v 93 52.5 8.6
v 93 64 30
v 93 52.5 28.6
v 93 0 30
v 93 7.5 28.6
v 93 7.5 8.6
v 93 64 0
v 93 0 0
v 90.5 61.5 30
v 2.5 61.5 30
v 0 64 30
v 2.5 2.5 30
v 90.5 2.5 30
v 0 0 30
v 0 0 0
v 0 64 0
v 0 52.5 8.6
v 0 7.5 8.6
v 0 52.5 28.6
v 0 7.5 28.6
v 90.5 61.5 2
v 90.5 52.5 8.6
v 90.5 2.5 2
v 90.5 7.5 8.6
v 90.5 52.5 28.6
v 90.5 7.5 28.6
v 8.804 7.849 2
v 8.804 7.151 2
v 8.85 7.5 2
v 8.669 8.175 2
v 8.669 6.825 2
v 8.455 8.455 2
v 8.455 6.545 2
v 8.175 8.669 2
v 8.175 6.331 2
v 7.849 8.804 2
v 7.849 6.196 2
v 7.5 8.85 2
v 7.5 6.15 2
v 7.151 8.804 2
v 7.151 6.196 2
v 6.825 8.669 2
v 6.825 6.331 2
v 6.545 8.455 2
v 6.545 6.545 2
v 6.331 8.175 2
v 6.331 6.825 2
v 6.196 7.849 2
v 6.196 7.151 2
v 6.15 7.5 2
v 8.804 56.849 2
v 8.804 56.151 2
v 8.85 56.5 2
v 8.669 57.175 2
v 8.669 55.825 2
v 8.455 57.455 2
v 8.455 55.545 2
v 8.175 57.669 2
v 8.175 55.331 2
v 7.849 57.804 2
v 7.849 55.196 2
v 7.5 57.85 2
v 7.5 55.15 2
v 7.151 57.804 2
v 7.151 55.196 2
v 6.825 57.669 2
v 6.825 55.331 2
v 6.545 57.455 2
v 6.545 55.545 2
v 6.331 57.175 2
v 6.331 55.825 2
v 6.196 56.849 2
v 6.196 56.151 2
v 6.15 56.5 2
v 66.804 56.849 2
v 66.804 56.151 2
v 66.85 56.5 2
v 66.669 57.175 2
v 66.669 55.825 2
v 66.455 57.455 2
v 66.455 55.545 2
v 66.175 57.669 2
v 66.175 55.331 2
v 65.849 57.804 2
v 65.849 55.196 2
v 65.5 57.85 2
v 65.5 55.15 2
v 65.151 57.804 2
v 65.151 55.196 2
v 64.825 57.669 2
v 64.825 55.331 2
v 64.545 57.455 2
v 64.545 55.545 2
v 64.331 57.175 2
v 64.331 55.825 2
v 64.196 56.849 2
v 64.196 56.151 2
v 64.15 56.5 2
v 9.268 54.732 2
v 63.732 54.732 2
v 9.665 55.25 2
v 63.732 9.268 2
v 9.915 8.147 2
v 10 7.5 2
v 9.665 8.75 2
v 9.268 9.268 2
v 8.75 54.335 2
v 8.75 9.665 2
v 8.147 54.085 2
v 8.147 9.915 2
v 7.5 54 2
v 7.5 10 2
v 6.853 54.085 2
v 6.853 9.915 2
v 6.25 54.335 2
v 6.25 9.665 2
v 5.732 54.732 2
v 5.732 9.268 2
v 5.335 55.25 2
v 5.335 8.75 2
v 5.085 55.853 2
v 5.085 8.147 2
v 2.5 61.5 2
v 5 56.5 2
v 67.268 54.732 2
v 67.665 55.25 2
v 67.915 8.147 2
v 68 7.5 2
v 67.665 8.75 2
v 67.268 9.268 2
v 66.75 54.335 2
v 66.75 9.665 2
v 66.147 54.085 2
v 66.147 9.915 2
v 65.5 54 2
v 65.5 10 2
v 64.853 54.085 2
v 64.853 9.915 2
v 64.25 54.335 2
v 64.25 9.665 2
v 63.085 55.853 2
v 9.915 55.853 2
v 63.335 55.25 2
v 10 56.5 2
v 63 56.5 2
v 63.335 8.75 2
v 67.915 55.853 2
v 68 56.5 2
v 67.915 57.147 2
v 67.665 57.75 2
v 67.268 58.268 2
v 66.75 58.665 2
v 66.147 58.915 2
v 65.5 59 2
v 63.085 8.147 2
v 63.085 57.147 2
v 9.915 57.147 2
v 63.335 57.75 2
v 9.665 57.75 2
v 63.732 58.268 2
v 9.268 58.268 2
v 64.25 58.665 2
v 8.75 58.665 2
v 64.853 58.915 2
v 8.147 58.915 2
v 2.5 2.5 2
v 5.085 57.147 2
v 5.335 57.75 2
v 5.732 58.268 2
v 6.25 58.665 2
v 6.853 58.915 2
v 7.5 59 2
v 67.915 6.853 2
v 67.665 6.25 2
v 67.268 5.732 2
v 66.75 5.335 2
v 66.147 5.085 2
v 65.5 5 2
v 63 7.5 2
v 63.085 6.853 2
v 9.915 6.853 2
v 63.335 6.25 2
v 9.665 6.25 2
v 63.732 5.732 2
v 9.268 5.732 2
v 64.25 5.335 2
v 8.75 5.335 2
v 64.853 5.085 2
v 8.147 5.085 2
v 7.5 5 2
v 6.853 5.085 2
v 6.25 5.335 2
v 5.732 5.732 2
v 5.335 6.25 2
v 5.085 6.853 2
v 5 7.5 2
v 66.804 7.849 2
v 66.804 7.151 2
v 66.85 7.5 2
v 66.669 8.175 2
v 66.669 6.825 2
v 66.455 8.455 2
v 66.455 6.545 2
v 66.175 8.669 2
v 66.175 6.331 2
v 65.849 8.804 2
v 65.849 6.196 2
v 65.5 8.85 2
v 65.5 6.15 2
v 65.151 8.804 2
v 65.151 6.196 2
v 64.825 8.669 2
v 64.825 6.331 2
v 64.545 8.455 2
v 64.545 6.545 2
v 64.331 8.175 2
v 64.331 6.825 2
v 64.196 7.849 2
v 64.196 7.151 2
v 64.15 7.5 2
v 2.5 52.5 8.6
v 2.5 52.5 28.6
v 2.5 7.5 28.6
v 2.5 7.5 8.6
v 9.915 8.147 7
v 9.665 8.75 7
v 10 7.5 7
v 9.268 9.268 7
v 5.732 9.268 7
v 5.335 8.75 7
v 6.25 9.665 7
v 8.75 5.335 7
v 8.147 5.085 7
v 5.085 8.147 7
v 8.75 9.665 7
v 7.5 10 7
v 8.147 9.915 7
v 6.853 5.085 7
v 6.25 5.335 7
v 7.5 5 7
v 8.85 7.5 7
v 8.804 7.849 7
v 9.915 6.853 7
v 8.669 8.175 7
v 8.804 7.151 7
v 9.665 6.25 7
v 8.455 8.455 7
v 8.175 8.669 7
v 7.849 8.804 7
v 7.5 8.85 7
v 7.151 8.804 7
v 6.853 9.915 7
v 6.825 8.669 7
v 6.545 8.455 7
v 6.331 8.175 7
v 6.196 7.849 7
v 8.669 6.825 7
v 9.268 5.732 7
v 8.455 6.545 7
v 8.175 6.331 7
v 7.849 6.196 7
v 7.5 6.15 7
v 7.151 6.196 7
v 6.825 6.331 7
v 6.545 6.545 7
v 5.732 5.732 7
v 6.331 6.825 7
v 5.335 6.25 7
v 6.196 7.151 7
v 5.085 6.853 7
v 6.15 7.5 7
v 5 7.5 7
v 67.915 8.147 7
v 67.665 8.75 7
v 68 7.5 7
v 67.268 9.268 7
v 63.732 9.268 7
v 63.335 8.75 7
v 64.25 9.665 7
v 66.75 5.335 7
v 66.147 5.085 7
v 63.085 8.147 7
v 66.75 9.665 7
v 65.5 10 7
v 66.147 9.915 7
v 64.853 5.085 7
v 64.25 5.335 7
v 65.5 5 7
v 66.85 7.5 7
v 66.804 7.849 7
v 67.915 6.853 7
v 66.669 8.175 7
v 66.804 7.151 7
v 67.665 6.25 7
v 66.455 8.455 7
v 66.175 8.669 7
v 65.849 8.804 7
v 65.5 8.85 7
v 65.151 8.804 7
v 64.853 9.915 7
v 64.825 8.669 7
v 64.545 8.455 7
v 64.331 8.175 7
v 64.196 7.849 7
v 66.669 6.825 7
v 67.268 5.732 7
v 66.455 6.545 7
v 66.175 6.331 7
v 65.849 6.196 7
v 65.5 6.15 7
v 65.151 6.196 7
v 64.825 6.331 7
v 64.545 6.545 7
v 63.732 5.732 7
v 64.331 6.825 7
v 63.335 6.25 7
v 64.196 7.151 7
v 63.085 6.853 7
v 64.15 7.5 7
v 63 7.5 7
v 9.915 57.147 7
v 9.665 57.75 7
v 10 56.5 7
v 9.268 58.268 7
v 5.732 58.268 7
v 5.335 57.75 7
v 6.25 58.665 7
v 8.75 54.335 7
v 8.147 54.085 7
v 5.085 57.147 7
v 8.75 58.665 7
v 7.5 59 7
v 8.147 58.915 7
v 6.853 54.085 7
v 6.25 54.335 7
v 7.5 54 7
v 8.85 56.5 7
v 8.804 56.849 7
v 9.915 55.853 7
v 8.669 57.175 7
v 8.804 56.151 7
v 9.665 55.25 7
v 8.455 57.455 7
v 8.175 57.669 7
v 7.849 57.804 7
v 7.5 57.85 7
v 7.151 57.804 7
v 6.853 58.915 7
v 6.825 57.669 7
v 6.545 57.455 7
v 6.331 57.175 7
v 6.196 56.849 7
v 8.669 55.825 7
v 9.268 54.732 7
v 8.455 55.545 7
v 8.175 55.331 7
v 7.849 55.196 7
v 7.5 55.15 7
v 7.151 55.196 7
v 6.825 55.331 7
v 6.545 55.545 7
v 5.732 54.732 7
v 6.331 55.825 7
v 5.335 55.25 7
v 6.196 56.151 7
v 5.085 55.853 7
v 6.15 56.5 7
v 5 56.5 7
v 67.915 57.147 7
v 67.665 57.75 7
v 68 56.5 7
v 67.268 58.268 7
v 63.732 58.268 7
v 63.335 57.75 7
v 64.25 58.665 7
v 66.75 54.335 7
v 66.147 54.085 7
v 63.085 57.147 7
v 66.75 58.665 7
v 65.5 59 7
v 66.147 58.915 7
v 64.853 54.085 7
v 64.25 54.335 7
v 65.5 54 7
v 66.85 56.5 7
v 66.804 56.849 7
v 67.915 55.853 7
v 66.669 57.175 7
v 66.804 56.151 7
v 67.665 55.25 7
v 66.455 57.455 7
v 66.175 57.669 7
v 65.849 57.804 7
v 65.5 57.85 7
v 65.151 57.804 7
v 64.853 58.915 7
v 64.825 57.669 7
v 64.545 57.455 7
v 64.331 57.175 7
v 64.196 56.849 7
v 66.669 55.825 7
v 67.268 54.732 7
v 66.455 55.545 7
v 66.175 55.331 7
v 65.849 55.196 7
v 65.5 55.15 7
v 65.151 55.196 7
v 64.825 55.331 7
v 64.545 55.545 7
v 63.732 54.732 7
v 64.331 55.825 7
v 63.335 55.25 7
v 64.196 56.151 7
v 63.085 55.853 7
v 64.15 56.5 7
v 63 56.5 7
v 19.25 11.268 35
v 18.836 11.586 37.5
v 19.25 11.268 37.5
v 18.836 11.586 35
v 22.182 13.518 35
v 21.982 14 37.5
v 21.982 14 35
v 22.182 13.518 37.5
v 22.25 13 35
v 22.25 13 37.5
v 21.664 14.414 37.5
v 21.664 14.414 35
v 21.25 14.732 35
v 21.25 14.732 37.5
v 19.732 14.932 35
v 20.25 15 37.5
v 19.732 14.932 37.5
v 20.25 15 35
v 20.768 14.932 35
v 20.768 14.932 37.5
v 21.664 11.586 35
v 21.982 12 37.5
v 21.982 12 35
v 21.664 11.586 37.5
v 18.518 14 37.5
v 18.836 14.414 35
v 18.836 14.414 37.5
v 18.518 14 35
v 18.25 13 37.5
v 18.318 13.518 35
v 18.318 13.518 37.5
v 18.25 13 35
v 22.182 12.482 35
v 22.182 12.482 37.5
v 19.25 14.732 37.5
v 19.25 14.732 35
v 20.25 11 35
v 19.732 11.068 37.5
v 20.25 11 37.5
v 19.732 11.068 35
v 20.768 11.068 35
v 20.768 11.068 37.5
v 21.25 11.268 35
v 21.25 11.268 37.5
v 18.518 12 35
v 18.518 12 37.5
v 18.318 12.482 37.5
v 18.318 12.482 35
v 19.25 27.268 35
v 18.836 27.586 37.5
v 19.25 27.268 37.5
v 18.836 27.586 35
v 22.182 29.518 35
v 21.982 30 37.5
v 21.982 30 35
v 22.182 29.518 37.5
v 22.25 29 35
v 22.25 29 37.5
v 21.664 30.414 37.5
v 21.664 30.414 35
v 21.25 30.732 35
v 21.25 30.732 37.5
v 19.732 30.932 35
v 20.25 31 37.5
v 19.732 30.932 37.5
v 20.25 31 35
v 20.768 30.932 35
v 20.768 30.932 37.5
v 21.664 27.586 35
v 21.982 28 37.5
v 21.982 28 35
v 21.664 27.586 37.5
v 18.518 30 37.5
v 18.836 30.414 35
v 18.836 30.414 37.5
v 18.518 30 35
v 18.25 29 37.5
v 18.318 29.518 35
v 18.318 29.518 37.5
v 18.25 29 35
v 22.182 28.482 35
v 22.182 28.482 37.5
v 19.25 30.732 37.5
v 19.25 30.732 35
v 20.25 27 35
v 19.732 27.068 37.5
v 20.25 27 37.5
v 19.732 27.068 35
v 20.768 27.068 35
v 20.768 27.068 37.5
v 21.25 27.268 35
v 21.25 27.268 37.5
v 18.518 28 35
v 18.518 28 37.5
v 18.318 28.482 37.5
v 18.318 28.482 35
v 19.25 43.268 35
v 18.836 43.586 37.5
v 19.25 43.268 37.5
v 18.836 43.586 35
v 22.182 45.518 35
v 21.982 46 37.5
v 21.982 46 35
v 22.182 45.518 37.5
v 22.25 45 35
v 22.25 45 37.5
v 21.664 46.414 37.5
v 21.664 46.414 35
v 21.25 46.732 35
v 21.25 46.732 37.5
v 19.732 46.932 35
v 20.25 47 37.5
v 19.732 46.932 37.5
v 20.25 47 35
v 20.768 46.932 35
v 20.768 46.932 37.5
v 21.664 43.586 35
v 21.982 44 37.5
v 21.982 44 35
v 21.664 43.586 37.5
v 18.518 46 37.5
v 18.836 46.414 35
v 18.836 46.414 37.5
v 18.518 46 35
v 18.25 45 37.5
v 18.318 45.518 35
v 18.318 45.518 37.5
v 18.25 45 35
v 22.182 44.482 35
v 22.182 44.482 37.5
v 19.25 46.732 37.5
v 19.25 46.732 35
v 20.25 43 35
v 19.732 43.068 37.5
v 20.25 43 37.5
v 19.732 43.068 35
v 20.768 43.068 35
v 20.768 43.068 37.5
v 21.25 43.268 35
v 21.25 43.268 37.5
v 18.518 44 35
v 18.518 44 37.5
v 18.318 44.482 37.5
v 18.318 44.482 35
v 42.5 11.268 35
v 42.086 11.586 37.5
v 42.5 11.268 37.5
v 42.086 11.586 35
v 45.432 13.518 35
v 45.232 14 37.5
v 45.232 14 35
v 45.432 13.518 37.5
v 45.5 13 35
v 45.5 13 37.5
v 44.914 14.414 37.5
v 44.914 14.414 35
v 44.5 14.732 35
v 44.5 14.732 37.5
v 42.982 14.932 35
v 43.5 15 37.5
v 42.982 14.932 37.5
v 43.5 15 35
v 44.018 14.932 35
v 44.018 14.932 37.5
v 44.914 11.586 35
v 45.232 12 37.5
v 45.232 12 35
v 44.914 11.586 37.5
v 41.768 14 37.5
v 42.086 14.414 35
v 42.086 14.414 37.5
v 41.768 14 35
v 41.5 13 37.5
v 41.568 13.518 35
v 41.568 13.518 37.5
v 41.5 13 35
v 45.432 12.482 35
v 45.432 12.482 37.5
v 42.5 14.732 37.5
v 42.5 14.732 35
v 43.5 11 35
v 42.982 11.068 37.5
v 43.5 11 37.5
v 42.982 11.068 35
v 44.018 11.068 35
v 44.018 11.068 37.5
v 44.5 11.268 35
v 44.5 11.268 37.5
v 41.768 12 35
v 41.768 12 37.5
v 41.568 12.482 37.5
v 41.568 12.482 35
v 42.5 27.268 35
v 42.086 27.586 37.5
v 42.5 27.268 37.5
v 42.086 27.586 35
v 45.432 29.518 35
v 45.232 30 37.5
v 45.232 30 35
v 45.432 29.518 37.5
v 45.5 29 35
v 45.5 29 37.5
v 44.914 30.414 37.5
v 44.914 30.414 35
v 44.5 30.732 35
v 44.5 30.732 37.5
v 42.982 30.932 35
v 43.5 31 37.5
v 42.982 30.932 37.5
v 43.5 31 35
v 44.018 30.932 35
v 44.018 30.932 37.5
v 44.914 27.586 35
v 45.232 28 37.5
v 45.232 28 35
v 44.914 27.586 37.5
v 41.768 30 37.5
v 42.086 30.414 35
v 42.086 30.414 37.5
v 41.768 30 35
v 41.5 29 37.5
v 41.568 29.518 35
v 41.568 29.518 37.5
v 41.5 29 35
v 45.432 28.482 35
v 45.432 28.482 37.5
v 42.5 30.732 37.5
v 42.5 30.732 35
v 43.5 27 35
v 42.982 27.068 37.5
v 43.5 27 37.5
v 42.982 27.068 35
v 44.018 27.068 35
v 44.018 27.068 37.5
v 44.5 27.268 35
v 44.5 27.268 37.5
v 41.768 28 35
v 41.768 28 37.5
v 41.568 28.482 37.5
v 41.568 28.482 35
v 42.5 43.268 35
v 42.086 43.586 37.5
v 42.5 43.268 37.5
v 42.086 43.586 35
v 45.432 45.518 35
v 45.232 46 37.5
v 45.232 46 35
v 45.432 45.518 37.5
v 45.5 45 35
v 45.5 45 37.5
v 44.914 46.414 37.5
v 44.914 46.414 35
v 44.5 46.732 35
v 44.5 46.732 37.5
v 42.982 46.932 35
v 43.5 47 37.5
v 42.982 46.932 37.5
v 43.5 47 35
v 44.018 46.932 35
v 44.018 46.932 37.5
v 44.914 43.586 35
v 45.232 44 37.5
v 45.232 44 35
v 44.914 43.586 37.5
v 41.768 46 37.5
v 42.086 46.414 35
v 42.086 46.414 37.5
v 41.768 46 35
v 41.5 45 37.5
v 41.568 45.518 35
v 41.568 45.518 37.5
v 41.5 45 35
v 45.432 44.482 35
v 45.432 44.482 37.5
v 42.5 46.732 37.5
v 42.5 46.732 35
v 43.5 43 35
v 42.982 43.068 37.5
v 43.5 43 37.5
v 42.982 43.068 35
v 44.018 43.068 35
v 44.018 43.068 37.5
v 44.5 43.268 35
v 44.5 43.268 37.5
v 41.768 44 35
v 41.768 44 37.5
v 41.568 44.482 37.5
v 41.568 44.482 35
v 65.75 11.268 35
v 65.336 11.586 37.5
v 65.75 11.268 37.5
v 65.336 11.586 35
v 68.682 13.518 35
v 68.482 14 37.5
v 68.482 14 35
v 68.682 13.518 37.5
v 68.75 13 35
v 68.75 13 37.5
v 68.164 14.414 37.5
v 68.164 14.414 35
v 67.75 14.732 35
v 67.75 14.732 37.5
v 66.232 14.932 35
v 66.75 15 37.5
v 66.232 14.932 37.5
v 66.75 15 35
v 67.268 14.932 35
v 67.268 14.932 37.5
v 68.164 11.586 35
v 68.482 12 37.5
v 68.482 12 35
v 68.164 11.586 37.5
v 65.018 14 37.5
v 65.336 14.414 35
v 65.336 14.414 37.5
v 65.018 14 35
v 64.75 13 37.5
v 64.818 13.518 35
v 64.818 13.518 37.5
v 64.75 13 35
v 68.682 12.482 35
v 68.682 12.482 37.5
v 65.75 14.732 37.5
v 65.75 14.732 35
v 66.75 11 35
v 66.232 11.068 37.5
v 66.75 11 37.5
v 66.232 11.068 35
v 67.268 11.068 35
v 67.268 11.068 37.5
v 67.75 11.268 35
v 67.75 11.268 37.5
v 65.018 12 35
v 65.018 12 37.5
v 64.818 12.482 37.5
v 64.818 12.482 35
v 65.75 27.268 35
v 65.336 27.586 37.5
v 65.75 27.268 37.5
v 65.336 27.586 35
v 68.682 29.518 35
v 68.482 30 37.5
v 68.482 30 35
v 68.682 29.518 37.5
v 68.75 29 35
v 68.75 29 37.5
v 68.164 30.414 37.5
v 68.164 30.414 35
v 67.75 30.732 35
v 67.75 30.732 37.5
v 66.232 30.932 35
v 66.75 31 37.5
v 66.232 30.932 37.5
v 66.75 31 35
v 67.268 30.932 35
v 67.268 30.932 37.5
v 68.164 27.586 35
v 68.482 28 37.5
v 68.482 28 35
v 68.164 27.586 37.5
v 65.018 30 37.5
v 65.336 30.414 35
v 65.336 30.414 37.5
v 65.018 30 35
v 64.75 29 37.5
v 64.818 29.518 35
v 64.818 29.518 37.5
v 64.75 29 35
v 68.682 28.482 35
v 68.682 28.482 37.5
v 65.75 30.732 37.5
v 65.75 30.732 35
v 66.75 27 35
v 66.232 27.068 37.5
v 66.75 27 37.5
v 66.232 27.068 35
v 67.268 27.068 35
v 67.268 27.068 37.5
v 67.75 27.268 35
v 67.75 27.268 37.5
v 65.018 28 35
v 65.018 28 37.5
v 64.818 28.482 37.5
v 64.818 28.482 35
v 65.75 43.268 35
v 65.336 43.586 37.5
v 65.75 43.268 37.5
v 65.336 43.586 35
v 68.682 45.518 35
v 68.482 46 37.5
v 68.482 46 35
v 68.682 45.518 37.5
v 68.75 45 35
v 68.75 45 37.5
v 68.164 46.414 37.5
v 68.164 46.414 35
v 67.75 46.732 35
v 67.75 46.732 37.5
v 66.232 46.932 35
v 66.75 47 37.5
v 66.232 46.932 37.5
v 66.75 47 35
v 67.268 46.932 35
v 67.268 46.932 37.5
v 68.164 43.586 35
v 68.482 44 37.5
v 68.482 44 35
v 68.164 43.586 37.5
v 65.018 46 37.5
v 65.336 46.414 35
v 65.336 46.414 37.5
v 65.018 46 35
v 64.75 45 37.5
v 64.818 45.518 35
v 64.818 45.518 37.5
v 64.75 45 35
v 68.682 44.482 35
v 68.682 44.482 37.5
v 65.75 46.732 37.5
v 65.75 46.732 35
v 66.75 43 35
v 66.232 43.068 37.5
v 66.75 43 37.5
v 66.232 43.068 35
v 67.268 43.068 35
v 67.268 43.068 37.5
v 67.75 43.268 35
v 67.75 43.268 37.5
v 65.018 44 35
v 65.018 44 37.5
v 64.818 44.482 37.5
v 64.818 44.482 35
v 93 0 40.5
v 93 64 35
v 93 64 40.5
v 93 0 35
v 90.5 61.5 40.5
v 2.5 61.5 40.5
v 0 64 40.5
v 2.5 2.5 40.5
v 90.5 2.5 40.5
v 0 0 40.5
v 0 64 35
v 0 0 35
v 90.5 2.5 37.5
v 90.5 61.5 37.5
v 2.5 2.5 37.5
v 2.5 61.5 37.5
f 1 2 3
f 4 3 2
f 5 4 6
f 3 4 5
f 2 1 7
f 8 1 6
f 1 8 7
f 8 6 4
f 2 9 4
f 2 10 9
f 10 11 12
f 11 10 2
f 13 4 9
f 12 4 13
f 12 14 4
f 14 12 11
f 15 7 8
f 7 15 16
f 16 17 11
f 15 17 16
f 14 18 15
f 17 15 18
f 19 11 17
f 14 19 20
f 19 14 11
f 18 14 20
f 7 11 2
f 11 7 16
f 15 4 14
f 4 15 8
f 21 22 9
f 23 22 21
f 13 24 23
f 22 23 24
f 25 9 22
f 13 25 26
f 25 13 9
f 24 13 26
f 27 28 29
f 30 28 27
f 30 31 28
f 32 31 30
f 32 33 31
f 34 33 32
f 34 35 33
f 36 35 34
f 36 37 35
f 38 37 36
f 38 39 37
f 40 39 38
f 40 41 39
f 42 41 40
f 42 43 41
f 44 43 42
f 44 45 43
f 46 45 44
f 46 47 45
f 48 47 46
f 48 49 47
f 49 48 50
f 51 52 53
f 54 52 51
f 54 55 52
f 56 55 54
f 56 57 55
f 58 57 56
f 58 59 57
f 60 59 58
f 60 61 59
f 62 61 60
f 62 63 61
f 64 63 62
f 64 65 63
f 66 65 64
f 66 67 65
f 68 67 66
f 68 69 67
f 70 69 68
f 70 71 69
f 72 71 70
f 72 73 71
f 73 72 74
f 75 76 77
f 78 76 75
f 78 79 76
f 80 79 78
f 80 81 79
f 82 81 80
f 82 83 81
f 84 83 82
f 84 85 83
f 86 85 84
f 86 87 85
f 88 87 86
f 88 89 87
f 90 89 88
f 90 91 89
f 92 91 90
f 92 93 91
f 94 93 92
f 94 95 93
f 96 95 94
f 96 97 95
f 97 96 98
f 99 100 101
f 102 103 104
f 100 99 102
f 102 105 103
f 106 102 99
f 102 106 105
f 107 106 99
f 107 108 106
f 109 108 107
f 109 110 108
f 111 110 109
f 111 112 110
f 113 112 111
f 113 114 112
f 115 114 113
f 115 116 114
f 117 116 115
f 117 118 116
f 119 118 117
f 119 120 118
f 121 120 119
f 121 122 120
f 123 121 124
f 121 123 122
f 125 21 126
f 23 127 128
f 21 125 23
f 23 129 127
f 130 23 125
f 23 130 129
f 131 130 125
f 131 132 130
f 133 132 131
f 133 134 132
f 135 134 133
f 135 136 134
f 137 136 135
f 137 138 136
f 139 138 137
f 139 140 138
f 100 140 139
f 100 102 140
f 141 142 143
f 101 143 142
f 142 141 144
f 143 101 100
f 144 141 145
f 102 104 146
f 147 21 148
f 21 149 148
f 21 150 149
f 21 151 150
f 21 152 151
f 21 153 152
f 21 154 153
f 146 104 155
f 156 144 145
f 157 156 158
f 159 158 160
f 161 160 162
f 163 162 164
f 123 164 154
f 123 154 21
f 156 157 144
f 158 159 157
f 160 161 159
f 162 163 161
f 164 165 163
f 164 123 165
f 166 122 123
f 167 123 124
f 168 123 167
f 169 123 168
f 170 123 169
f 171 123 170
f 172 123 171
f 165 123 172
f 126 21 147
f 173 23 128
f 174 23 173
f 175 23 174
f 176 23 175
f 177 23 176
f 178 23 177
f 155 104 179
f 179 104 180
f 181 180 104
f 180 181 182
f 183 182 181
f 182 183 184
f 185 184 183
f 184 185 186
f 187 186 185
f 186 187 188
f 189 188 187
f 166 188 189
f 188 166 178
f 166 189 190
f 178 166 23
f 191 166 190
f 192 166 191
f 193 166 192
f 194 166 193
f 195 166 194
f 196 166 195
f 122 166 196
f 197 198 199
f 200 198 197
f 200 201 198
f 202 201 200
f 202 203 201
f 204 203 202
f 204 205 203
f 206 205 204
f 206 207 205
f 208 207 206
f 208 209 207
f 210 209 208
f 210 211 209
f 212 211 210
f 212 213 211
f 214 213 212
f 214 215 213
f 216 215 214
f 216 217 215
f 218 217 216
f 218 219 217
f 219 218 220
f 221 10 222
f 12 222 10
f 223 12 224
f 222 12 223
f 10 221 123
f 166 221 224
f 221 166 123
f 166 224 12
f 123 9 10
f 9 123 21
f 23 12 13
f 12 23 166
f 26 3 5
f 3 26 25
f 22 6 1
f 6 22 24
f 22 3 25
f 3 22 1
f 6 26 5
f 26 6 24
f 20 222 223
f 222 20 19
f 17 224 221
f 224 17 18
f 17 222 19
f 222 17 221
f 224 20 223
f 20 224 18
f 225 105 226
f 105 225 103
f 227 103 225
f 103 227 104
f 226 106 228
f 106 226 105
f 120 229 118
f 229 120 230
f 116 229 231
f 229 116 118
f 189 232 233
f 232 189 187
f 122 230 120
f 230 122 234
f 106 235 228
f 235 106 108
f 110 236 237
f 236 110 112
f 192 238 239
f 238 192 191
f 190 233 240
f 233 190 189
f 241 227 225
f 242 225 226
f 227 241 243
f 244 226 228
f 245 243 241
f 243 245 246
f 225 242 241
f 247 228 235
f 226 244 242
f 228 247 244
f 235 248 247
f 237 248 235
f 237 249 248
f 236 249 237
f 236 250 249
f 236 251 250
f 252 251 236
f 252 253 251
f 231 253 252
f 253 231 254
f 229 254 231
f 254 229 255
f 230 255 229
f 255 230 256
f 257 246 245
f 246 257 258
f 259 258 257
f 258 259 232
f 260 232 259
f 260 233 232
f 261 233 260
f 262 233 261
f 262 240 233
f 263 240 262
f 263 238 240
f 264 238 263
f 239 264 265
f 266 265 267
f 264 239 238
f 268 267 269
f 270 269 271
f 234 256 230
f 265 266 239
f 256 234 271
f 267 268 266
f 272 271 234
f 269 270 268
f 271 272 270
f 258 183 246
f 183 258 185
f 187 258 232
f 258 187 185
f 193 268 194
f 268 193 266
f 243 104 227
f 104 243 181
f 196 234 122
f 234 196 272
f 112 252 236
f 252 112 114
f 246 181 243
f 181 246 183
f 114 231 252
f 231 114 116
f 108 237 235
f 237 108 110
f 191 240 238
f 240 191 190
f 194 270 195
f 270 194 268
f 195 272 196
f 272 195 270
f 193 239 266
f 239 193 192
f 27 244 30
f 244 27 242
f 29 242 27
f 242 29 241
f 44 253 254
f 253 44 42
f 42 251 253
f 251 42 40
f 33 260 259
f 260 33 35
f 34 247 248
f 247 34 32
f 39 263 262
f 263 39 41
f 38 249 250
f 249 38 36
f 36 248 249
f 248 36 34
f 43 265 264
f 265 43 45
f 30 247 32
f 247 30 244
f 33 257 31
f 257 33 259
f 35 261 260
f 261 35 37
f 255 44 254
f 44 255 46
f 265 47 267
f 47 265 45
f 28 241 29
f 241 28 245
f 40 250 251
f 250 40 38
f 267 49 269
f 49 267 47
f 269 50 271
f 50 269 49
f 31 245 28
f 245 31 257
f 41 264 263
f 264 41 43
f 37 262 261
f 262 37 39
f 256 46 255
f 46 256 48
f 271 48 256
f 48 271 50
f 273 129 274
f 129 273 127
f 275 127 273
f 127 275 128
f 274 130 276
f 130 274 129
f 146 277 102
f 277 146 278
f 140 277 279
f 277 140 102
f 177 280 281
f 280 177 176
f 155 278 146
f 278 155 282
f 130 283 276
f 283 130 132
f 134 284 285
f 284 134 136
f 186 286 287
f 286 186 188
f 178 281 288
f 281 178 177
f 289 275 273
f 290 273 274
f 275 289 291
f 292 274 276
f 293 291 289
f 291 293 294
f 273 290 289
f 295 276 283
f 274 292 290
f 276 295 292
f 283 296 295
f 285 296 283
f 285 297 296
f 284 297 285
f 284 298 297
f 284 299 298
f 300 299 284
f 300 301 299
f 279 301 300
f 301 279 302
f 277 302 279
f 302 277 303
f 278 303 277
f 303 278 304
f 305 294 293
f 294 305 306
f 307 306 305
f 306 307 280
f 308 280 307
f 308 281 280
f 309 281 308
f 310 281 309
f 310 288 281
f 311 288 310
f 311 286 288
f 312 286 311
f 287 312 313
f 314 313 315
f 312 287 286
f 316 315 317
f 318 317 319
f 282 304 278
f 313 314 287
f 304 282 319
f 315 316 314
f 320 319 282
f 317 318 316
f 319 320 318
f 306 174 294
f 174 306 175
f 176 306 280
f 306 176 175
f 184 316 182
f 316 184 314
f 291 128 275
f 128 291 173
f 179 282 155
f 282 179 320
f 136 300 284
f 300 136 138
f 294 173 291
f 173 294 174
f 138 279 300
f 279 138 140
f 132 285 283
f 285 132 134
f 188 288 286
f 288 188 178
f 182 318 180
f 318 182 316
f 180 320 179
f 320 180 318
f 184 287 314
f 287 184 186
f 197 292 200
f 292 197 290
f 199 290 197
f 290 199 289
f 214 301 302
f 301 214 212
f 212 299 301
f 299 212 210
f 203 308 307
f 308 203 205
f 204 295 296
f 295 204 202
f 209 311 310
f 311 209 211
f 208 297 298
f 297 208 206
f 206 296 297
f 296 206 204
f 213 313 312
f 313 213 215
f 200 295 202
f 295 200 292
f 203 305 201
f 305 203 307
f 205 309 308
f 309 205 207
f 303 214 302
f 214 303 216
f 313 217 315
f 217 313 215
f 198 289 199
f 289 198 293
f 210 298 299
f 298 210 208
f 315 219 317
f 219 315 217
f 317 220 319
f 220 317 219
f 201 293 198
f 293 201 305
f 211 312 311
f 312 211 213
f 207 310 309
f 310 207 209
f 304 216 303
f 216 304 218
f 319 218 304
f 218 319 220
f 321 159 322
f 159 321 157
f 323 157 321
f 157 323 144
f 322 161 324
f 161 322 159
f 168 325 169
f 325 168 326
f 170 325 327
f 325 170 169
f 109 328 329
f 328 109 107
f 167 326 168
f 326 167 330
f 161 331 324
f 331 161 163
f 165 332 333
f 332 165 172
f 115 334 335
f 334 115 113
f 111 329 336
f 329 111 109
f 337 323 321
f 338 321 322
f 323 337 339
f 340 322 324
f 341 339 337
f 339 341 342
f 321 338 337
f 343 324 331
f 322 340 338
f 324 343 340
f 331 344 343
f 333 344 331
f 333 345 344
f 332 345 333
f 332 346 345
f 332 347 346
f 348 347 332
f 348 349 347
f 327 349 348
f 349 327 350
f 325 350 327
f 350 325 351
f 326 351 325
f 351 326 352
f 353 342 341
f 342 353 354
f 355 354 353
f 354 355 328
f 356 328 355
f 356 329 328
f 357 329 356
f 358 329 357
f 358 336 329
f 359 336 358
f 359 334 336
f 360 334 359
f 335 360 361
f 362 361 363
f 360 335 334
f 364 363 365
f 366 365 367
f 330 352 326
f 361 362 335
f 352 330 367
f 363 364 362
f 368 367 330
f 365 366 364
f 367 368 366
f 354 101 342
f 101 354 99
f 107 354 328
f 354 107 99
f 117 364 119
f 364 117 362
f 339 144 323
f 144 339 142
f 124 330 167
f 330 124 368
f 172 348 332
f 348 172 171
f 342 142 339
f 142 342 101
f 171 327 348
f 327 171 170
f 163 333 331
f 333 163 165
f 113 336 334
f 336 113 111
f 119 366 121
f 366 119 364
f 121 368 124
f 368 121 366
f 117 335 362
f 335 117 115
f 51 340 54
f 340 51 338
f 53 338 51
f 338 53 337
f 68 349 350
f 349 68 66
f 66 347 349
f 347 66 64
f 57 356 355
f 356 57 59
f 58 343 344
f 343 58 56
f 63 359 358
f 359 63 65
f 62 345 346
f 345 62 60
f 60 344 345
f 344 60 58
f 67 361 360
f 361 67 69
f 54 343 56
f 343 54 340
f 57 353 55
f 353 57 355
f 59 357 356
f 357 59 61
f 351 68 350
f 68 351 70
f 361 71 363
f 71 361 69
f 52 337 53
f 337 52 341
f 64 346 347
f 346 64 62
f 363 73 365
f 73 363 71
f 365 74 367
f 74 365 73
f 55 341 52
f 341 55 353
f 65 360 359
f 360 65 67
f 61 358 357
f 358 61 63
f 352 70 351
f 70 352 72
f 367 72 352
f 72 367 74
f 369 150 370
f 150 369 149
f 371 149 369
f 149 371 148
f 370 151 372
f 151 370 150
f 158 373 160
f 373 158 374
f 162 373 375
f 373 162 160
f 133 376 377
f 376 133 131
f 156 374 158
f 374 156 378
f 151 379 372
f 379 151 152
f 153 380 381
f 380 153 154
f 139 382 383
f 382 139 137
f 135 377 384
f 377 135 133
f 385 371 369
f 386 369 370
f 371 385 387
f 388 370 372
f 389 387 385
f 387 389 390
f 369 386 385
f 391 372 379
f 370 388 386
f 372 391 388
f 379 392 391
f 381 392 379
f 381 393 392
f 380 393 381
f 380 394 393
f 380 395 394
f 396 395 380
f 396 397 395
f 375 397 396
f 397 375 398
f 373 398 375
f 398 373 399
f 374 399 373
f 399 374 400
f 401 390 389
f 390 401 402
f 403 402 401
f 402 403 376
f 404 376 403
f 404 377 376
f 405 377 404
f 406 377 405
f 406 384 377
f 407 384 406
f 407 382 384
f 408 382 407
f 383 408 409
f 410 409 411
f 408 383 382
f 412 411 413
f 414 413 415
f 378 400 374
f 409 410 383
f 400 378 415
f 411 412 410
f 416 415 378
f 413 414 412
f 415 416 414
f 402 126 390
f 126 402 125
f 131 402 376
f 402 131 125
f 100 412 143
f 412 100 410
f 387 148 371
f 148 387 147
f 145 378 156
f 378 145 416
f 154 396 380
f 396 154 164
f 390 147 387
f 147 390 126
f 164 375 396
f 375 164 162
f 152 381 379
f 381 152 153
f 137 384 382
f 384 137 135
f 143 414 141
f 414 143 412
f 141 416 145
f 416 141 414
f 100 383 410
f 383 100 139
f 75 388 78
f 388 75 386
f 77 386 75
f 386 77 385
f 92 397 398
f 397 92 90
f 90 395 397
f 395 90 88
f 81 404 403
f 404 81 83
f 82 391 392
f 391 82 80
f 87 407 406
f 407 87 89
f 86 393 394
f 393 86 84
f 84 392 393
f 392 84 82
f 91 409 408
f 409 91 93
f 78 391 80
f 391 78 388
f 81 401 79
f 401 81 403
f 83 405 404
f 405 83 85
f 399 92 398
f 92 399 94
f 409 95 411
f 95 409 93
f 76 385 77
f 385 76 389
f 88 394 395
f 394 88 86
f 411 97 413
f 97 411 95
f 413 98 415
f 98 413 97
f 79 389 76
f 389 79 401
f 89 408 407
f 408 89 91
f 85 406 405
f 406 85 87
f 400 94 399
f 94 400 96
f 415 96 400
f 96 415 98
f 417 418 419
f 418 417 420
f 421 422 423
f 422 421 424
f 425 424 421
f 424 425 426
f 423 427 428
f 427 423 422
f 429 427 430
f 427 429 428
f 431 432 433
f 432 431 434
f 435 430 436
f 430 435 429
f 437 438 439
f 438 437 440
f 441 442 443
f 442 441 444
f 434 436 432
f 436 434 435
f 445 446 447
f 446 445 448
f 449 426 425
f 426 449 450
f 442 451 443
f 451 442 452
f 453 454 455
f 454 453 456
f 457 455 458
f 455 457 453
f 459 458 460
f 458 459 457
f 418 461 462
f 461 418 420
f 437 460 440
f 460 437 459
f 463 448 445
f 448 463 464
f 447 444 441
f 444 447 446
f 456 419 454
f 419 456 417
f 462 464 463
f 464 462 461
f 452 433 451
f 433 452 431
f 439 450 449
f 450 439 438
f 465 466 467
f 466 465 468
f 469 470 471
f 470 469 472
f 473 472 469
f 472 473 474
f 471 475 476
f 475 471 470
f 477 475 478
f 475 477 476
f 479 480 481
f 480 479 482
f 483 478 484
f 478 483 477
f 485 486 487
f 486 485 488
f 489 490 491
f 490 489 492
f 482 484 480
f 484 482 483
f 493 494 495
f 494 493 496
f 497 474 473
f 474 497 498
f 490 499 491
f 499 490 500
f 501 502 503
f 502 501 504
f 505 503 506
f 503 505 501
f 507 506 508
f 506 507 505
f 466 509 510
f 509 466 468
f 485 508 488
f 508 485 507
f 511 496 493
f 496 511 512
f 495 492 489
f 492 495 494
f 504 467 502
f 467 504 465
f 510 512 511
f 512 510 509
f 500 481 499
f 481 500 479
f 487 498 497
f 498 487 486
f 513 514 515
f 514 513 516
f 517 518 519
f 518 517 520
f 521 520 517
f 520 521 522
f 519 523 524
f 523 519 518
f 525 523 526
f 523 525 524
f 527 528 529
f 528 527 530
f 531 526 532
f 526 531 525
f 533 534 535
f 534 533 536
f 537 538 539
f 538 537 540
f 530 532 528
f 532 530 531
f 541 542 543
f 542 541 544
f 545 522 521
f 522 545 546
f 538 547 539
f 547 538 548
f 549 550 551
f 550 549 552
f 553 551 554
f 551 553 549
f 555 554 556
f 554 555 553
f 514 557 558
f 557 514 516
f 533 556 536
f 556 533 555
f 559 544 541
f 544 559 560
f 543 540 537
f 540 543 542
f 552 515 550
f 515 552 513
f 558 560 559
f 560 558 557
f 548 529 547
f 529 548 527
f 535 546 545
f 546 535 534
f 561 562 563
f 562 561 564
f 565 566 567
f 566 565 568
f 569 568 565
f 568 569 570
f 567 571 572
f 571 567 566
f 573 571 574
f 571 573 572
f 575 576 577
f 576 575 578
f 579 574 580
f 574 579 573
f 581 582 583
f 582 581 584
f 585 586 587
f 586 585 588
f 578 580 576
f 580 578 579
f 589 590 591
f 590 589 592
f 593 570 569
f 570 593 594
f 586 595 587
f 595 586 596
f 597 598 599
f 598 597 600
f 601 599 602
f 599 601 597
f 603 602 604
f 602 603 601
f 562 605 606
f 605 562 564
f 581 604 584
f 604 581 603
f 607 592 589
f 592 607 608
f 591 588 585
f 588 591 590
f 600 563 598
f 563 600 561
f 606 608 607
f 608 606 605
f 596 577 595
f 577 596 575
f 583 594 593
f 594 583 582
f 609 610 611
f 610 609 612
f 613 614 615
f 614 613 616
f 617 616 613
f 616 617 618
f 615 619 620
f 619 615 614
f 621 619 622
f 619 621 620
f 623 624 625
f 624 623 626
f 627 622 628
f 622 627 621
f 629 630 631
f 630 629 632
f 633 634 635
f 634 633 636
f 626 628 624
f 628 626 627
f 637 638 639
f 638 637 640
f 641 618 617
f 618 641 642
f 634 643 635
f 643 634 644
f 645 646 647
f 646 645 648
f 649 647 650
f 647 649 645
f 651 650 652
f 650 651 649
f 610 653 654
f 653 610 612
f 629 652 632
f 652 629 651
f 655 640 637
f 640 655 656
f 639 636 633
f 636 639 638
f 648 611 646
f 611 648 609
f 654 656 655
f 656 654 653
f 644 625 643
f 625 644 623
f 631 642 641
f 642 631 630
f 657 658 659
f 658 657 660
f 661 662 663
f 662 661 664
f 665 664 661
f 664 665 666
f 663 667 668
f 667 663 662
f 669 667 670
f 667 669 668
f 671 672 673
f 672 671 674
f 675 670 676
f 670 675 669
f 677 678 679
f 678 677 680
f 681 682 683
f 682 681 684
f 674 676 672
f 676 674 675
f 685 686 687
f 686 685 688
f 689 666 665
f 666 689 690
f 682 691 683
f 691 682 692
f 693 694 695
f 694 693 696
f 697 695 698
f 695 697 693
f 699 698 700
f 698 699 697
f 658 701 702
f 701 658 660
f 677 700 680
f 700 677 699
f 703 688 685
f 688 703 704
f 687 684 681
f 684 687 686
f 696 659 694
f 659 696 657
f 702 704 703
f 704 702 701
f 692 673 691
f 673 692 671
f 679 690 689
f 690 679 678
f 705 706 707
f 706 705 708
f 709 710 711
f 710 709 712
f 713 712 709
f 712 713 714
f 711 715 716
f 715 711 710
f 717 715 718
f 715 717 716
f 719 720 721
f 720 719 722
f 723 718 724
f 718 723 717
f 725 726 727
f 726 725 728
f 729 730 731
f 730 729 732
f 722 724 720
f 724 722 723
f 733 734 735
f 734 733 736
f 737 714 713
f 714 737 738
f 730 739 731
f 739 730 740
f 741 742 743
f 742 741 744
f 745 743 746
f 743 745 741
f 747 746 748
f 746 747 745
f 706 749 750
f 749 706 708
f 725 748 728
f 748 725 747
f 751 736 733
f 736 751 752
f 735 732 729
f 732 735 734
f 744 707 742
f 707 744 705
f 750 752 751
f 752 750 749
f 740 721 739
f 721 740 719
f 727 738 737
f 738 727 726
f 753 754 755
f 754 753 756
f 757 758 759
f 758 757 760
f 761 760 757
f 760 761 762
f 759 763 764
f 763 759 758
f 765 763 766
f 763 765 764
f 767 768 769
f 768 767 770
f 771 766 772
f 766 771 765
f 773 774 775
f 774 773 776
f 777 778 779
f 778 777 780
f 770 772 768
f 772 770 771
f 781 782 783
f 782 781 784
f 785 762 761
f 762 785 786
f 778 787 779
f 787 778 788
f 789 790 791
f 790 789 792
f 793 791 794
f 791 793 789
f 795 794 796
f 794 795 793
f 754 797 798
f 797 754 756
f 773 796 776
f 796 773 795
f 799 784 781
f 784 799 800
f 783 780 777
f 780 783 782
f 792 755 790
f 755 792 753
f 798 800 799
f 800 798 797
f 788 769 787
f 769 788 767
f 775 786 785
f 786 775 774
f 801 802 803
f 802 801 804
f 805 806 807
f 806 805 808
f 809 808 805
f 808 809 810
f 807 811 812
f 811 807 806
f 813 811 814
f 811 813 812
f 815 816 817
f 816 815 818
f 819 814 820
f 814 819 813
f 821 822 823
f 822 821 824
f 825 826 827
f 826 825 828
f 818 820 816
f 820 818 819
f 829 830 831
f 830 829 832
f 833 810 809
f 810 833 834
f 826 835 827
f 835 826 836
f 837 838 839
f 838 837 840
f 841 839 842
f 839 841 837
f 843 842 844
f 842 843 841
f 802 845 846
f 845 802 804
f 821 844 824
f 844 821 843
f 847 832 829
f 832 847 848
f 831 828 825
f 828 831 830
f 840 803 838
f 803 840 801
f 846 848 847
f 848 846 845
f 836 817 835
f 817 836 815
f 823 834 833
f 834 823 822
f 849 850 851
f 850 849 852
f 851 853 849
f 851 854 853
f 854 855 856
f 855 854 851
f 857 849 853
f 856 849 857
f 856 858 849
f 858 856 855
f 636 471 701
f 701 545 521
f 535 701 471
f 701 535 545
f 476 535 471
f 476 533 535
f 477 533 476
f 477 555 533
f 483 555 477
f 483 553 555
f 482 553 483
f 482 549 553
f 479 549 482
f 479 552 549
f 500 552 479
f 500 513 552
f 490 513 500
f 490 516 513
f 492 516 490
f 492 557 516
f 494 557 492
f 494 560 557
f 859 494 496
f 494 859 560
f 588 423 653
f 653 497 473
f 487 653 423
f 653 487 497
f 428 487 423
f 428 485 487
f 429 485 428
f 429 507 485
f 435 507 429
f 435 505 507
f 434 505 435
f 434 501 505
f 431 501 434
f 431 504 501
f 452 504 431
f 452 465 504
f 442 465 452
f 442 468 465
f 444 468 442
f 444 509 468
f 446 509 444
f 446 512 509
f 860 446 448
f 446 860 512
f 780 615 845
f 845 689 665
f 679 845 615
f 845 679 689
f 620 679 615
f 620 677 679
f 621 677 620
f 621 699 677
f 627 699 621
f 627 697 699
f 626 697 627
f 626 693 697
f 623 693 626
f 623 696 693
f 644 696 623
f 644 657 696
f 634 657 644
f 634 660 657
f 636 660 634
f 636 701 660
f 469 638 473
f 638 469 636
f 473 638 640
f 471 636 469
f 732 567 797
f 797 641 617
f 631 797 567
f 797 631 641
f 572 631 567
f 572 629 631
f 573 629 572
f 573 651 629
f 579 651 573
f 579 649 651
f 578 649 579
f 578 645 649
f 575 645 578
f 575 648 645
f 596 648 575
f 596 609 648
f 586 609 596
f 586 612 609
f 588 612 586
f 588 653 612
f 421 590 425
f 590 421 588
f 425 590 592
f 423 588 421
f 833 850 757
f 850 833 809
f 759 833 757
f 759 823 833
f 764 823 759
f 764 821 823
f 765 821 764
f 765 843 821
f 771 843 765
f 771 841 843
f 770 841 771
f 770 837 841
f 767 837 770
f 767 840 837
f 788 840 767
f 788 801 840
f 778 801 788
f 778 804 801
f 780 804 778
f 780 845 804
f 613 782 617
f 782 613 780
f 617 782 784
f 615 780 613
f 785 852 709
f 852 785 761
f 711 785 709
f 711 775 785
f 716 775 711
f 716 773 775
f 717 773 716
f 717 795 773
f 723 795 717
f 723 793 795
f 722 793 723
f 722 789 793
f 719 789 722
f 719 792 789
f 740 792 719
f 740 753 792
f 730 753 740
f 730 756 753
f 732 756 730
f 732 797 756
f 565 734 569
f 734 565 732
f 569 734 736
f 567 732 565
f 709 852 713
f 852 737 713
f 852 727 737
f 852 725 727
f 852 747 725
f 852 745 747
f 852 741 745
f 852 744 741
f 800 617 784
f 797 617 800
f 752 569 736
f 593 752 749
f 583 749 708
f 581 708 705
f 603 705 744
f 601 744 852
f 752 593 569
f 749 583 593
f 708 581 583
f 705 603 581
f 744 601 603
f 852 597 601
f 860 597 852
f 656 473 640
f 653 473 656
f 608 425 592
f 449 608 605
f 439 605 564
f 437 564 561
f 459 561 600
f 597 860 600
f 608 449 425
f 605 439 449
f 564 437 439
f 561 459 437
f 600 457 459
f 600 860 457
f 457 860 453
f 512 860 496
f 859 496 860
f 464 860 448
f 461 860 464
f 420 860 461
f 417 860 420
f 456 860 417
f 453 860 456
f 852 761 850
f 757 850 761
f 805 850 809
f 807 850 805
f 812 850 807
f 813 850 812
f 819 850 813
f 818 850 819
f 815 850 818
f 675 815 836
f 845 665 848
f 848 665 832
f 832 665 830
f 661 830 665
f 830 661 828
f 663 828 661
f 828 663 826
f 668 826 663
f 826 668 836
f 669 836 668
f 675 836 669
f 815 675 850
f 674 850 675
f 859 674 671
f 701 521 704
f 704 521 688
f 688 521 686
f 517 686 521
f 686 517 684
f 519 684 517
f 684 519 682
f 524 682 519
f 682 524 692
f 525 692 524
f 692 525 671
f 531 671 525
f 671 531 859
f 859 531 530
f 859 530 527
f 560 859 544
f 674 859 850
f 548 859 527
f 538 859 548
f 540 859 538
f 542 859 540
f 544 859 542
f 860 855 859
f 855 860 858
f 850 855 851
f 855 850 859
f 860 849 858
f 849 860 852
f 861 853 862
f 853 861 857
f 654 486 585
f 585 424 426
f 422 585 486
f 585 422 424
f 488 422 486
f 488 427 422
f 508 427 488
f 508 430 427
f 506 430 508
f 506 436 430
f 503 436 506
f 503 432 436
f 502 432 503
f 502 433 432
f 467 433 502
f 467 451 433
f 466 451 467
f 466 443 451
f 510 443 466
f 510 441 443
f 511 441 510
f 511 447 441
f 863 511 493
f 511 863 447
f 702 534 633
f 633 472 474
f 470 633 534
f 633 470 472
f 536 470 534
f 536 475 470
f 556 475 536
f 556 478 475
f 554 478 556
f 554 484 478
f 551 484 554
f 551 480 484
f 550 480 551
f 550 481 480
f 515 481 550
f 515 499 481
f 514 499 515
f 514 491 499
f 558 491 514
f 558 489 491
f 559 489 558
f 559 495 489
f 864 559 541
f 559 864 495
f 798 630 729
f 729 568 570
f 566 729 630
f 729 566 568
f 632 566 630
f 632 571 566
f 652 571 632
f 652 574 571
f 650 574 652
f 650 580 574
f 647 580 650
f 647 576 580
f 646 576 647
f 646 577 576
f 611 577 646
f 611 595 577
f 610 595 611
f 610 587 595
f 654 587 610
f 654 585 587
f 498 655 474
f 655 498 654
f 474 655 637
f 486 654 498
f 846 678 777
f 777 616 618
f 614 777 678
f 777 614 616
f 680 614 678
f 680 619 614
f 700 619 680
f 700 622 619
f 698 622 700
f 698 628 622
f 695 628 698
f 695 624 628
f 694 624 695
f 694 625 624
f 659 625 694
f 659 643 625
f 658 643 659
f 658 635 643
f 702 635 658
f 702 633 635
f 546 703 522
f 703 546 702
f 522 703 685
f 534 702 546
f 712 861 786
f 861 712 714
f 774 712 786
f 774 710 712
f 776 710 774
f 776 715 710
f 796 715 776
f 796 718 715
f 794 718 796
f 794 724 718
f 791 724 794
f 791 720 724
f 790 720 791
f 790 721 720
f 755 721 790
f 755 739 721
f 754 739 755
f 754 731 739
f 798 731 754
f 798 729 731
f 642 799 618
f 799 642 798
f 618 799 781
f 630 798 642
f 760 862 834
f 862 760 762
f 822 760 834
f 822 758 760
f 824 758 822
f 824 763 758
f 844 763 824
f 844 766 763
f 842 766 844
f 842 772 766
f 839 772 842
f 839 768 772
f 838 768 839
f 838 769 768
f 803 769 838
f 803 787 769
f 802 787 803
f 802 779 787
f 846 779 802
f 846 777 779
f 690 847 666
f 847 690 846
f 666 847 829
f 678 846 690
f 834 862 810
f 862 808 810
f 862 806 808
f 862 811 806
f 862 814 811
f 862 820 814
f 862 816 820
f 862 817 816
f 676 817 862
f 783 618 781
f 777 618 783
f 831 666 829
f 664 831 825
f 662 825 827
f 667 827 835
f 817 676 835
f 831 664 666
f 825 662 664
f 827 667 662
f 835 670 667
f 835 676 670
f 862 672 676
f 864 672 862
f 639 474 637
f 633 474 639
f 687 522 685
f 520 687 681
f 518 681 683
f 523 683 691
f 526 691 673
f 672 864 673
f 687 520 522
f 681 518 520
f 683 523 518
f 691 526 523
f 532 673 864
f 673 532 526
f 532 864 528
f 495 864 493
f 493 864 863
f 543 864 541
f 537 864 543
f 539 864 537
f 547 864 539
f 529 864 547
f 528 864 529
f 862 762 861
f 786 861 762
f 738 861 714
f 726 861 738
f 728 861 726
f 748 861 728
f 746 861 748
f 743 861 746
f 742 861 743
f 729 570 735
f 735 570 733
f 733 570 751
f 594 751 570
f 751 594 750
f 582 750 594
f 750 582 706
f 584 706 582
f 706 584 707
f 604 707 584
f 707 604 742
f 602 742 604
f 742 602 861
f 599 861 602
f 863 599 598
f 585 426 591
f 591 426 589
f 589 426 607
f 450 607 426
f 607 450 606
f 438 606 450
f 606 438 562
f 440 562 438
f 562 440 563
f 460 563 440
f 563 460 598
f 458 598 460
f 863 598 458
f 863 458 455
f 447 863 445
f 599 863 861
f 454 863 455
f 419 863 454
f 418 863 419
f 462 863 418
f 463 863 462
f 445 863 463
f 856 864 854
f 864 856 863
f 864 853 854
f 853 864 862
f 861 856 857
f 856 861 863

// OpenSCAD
// ============================================================
// Raspberry Pi 4 Case — Parametric Board Mount
// ============================================================
// Snap-fit case for Raspberry Pi 4B.
// Adjust for other Pi variants by changing board dimensions.

// ---- BOARD DIMENSIONS (Pi 4B) ----
board_w     = 85;    // PCB width (mm)
board_d     = 56;    // PCB depth (mm)
board_t     = 1.6;   // PCB thickness (mm)
board_standoff_h = 5; // Height above bottom of standoff support

// ---- MOUNTING HOLES (Pi 4B — 58mm x 49mm pattern) ----
hole_x1 = 3.5;   hole_x2 = 61.5;
hole_y1 = 3.5;   hole_y2 = 52.5;
hole_d  = 2.7;   // M2.5 clearance = 2.7mm

// ---- CASE GEOMETRY ----
wall        = 2.5;   // Case wall thickness
base_t      = 2;     // Bottom plate thickness
lid_lip     = 3;     // Snap-fit lid overlap height
clearance   = 1.5;   // Clearance on each side around board
port_h      = 20;    // Port cutout height (covers all ports generously)

case_w = board_w + clearance*2 + wall*2;
case_d = board_d + clearance*2 + wall*2;
case_h = 30;  // Total case height — adjust for your board + components

// ---- STANDOFFS ----
module standoff(x, y) {
    translate([x + wall + clearance, y + wall + clearance, base_t])
    difference() {
        cylinder(d=5, h=board_standoff_h, $fn=24);
        translate([0, 0, -0.1]) cylinder(d=hole_d, h=board_standoff_h + 0.2, $fn=24);
    }
}

// ---- CASE BODY ----
module case_body() {
    difference() {
        cube([case_w, case_d, case_h]);
        // Inner cavity
        translate([wall, wall, base_t])
            cube([case_w - wall*2, case_d - wall*2, case_h]);
        // Port cutouts (adjust positions for real use)
        // USB side (right)
        translate([case_w - wall - 0.1, wall + 5, base_t + board_t + board_standoff_h])
            cube([wall + 0.2, 45, port_h]);
        // HDMI/USB-C side (left)
        translate([-0.1, wall + 5, base_t + board_t + board_standoff_h])
            cube([wall + 0.2, 45, port_h]);
    }
}

// ---- LID ----
module lid() {
    translate([0, 0, case_h + 5]) // offset for display — remove in final assembly
    difference() {
        cube([case_w, case_d, wall + lid_lip]);
        // Snap-fit inner lip
        translate([wall, wall, wall])
            cube([case_w - wall*2, case_d - wall*2, lid_lip + 0.1]);
        // Vent holes (3x3 grid)
        for (x = [1:3], y = [1:3])
            translate([case_w/4 * x - 3, case_d/4 * y - 3, -0.1])
                cylinder(d=4, h=wall + 0.2, $fn=24);
    }
}

// ---- ASSEMBLE ----
case_body();
standoff(hole_x1, hole_y1);
standoff(hole_x2, hole_y1);
standoff(hole_x1, hole_y2);
standoff(hole_x2, hole_y2);
lid();
